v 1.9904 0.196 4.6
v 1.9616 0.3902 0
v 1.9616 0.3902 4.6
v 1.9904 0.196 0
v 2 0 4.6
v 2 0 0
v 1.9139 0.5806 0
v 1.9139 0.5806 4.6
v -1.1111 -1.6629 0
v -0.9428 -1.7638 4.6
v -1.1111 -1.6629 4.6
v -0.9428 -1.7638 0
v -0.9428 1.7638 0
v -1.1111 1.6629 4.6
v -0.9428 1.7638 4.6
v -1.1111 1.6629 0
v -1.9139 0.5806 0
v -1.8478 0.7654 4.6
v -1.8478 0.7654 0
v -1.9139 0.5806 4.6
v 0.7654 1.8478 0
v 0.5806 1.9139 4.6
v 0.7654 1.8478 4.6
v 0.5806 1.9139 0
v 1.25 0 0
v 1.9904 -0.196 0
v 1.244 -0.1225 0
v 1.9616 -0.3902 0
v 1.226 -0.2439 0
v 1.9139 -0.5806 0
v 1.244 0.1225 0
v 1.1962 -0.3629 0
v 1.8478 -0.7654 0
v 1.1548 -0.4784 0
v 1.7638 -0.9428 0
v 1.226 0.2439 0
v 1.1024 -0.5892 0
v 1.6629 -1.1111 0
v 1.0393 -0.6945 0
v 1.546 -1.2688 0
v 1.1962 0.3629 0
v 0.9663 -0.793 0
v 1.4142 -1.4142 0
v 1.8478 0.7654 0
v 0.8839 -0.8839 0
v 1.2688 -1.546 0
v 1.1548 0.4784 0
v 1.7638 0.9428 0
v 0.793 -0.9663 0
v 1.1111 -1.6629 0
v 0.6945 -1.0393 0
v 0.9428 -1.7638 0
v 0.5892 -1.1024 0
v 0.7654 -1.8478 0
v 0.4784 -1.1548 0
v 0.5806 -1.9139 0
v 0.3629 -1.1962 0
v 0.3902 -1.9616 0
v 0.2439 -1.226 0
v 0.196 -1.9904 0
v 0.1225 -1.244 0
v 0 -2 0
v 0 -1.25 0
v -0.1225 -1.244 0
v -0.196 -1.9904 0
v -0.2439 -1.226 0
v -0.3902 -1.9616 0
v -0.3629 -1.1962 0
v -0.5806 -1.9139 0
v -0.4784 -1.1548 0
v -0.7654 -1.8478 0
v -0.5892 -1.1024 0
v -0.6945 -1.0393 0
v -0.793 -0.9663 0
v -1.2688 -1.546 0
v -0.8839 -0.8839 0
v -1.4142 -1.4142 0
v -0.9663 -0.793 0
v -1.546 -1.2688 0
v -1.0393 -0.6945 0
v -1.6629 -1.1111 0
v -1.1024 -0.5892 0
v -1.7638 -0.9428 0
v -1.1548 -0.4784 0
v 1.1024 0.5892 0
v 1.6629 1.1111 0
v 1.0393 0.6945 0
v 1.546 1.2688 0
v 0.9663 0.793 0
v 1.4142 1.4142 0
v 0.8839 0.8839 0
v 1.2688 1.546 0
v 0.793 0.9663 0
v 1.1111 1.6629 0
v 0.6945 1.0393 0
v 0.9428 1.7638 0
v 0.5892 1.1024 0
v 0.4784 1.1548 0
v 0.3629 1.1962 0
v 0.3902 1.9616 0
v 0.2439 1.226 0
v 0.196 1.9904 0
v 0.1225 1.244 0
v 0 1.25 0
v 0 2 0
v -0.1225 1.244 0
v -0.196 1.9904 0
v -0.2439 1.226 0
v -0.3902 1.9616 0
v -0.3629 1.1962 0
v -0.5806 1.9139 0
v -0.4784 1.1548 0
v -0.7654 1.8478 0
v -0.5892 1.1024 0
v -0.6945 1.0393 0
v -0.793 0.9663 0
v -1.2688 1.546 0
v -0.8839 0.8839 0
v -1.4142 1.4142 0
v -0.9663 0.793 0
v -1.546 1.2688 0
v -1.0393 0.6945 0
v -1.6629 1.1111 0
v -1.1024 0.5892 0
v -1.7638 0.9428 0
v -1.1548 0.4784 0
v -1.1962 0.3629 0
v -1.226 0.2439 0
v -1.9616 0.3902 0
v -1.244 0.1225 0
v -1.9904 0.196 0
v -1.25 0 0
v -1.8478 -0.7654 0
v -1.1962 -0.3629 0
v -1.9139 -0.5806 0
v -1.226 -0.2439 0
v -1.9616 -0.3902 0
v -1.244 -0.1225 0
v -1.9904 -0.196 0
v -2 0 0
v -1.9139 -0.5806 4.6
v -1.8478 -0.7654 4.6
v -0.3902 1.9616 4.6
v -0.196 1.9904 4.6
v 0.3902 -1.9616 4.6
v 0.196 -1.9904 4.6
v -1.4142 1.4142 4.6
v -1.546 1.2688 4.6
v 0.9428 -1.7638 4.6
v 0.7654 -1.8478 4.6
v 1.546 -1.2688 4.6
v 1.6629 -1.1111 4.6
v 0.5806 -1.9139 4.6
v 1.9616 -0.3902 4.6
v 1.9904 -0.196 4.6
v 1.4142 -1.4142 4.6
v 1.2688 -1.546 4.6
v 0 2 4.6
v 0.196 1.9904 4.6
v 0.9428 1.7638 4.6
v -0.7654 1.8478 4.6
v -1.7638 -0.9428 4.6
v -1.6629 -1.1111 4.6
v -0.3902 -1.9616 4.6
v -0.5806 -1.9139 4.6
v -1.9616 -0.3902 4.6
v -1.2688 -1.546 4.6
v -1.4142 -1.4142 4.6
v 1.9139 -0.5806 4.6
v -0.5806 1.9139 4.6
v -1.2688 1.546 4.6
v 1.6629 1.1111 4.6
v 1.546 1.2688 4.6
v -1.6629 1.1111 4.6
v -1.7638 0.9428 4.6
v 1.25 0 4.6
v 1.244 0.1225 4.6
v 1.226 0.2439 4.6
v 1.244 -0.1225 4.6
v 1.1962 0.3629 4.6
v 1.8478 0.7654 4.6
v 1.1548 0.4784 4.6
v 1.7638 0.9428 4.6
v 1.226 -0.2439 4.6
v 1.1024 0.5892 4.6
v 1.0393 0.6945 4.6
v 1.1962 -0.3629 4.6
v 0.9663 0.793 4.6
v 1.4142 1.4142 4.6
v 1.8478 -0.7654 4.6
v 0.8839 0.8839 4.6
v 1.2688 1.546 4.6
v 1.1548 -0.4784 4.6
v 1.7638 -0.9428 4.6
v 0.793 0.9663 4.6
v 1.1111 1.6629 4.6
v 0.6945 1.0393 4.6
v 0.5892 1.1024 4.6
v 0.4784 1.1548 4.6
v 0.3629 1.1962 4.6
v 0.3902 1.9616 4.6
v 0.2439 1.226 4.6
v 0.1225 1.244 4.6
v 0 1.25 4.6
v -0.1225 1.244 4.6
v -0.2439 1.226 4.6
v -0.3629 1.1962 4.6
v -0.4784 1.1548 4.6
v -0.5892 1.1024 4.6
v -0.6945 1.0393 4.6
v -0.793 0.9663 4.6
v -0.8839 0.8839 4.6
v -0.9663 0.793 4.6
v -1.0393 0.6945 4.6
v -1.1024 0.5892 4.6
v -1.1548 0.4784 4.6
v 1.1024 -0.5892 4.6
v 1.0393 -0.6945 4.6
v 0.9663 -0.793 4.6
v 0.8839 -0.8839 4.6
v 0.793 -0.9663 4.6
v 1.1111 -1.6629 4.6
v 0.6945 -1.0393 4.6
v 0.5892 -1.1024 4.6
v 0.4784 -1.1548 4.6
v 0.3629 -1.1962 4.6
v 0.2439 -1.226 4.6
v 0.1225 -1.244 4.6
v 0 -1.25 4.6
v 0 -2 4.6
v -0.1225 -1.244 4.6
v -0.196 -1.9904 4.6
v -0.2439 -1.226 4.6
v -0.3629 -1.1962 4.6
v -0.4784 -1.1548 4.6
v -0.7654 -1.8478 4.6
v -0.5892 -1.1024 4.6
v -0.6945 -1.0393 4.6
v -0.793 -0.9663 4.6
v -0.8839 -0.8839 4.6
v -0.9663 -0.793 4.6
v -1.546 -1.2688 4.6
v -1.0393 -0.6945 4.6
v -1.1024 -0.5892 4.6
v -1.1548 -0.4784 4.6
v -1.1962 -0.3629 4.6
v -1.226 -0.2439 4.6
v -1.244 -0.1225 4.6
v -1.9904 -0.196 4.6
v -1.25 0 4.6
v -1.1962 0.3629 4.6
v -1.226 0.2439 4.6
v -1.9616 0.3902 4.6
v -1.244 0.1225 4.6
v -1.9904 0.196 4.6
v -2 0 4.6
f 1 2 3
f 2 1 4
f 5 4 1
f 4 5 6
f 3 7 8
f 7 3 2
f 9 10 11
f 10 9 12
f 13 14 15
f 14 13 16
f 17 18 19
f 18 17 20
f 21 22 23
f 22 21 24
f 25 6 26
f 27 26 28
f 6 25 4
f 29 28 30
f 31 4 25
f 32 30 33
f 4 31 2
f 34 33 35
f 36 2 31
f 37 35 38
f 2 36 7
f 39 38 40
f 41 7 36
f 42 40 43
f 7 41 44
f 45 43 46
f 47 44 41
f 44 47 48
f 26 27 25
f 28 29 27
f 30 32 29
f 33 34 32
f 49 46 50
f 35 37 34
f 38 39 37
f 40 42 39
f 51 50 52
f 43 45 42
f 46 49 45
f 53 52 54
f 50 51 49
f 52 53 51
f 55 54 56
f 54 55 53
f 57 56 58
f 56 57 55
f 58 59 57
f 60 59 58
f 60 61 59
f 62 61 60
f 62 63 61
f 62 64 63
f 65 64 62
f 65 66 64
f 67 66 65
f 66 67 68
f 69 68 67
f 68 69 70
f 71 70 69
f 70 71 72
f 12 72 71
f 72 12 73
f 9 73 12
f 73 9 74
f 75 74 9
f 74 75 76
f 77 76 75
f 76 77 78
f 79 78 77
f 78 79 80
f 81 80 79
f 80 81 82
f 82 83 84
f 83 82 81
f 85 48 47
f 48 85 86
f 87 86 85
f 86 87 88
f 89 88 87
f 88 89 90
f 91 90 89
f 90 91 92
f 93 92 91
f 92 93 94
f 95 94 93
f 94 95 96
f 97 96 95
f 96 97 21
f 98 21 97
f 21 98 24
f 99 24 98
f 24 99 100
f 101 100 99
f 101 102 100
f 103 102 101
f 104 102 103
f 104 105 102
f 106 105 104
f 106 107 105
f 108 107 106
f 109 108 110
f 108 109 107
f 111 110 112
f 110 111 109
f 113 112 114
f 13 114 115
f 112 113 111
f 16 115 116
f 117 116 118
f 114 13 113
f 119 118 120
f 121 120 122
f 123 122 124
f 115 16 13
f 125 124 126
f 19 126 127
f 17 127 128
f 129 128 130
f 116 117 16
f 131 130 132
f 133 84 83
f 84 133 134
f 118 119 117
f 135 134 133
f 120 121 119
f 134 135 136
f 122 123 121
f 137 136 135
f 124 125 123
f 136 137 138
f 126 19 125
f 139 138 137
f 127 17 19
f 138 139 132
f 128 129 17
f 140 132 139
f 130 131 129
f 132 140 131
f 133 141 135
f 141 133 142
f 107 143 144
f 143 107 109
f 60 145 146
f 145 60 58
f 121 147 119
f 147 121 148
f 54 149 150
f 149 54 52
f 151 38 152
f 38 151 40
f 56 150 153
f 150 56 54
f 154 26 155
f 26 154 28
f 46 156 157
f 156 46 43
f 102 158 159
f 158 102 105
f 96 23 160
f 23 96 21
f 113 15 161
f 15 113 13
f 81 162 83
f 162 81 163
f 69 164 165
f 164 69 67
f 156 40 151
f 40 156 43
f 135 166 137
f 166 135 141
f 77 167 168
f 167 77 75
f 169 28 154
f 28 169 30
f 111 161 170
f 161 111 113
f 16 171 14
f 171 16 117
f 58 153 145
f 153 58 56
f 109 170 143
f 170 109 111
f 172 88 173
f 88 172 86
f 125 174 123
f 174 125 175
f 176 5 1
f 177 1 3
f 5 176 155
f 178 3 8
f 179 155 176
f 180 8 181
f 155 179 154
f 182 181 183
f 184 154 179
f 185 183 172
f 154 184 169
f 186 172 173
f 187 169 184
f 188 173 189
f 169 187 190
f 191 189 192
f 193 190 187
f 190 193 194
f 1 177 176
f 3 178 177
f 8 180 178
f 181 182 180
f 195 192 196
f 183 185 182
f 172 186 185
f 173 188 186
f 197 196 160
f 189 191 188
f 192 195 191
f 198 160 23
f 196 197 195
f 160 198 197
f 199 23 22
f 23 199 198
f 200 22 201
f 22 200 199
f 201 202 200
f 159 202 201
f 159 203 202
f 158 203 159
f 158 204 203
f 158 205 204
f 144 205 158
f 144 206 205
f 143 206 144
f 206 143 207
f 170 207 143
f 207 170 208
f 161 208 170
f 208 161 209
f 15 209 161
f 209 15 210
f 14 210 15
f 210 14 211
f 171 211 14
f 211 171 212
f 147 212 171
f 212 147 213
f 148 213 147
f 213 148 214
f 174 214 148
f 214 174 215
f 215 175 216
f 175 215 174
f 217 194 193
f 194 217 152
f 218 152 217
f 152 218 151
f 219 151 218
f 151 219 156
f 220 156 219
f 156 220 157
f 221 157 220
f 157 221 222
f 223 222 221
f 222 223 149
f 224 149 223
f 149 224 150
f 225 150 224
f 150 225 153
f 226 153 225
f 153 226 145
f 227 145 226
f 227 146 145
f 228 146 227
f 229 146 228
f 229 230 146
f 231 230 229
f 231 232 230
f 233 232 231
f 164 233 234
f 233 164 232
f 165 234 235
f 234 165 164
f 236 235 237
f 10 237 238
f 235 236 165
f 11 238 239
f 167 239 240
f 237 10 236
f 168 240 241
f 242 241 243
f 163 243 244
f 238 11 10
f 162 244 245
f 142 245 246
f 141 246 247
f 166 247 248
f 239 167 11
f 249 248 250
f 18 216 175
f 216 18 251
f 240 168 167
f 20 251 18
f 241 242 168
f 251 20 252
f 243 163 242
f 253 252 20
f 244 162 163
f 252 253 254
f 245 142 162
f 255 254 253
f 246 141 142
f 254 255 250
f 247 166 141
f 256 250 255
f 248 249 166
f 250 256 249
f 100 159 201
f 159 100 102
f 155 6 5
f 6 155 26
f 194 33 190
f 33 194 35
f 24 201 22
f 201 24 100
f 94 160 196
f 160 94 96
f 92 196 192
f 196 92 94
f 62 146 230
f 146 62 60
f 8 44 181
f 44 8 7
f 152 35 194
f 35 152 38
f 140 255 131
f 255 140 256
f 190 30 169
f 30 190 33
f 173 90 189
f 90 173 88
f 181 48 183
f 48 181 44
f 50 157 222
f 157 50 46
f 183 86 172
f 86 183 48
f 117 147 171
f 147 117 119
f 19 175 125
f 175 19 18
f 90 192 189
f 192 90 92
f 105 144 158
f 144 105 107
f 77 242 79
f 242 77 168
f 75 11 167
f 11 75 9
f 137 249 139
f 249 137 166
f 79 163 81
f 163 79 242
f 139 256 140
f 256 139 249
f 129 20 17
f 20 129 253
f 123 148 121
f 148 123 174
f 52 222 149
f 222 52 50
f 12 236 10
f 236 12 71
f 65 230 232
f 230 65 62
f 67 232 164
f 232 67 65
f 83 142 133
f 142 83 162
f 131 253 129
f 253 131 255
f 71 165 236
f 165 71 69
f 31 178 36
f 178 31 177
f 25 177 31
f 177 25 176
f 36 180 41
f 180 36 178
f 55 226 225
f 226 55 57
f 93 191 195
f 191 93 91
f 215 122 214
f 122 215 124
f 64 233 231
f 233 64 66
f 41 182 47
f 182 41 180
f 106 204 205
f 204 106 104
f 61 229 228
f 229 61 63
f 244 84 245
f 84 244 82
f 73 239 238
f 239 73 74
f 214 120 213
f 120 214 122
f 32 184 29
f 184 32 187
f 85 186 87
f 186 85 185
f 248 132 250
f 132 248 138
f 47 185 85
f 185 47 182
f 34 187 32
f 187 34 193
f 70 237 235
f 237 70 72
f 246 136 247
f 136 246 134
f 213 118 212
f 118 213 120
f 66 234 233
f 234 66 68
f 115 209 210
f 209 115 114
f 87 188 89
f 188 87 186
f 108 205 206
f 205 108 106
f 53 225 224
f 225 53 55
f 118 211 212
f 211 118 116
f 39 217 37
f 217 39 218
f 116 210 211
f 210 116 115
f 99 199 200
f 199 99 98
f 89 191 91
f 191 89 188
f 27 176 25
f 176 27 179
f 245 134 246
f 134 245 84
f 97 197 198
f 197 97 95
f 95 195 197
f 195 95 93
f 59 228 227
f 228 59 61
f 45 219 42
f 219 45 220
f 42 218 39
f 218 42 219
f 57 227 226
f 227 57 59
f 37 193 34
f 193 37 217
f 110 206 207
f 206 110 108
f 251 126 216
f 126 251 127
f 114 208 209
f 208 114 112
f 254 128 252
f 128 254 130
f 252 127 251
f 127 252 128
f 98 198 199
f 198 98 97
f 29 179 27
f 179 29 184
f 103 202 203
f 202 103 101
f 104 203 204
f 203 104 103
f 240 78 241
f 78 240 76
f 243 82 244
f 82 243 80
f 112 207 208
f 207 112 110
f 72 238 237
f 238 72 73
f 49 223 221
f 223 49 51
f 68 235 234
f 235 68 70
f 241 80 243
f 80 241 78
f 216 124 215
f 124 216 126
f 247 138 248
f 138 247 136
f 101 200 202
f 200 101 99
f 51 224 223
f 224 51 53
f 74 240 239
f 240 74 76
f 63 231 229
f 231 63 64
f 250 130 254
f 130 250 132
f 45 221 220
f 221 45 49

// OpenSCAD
module threaded_insert() {
    difference() {
        // Outer cylinder
        cylinder(h=4.6, d=4.0, $fn=64);
        // Inner thread space for 2.5mm screw
        translate([0, 0, -1])
            cylinder(h=6.6, d=2.5, $fn=64);
    }
}

threaded_insert();
